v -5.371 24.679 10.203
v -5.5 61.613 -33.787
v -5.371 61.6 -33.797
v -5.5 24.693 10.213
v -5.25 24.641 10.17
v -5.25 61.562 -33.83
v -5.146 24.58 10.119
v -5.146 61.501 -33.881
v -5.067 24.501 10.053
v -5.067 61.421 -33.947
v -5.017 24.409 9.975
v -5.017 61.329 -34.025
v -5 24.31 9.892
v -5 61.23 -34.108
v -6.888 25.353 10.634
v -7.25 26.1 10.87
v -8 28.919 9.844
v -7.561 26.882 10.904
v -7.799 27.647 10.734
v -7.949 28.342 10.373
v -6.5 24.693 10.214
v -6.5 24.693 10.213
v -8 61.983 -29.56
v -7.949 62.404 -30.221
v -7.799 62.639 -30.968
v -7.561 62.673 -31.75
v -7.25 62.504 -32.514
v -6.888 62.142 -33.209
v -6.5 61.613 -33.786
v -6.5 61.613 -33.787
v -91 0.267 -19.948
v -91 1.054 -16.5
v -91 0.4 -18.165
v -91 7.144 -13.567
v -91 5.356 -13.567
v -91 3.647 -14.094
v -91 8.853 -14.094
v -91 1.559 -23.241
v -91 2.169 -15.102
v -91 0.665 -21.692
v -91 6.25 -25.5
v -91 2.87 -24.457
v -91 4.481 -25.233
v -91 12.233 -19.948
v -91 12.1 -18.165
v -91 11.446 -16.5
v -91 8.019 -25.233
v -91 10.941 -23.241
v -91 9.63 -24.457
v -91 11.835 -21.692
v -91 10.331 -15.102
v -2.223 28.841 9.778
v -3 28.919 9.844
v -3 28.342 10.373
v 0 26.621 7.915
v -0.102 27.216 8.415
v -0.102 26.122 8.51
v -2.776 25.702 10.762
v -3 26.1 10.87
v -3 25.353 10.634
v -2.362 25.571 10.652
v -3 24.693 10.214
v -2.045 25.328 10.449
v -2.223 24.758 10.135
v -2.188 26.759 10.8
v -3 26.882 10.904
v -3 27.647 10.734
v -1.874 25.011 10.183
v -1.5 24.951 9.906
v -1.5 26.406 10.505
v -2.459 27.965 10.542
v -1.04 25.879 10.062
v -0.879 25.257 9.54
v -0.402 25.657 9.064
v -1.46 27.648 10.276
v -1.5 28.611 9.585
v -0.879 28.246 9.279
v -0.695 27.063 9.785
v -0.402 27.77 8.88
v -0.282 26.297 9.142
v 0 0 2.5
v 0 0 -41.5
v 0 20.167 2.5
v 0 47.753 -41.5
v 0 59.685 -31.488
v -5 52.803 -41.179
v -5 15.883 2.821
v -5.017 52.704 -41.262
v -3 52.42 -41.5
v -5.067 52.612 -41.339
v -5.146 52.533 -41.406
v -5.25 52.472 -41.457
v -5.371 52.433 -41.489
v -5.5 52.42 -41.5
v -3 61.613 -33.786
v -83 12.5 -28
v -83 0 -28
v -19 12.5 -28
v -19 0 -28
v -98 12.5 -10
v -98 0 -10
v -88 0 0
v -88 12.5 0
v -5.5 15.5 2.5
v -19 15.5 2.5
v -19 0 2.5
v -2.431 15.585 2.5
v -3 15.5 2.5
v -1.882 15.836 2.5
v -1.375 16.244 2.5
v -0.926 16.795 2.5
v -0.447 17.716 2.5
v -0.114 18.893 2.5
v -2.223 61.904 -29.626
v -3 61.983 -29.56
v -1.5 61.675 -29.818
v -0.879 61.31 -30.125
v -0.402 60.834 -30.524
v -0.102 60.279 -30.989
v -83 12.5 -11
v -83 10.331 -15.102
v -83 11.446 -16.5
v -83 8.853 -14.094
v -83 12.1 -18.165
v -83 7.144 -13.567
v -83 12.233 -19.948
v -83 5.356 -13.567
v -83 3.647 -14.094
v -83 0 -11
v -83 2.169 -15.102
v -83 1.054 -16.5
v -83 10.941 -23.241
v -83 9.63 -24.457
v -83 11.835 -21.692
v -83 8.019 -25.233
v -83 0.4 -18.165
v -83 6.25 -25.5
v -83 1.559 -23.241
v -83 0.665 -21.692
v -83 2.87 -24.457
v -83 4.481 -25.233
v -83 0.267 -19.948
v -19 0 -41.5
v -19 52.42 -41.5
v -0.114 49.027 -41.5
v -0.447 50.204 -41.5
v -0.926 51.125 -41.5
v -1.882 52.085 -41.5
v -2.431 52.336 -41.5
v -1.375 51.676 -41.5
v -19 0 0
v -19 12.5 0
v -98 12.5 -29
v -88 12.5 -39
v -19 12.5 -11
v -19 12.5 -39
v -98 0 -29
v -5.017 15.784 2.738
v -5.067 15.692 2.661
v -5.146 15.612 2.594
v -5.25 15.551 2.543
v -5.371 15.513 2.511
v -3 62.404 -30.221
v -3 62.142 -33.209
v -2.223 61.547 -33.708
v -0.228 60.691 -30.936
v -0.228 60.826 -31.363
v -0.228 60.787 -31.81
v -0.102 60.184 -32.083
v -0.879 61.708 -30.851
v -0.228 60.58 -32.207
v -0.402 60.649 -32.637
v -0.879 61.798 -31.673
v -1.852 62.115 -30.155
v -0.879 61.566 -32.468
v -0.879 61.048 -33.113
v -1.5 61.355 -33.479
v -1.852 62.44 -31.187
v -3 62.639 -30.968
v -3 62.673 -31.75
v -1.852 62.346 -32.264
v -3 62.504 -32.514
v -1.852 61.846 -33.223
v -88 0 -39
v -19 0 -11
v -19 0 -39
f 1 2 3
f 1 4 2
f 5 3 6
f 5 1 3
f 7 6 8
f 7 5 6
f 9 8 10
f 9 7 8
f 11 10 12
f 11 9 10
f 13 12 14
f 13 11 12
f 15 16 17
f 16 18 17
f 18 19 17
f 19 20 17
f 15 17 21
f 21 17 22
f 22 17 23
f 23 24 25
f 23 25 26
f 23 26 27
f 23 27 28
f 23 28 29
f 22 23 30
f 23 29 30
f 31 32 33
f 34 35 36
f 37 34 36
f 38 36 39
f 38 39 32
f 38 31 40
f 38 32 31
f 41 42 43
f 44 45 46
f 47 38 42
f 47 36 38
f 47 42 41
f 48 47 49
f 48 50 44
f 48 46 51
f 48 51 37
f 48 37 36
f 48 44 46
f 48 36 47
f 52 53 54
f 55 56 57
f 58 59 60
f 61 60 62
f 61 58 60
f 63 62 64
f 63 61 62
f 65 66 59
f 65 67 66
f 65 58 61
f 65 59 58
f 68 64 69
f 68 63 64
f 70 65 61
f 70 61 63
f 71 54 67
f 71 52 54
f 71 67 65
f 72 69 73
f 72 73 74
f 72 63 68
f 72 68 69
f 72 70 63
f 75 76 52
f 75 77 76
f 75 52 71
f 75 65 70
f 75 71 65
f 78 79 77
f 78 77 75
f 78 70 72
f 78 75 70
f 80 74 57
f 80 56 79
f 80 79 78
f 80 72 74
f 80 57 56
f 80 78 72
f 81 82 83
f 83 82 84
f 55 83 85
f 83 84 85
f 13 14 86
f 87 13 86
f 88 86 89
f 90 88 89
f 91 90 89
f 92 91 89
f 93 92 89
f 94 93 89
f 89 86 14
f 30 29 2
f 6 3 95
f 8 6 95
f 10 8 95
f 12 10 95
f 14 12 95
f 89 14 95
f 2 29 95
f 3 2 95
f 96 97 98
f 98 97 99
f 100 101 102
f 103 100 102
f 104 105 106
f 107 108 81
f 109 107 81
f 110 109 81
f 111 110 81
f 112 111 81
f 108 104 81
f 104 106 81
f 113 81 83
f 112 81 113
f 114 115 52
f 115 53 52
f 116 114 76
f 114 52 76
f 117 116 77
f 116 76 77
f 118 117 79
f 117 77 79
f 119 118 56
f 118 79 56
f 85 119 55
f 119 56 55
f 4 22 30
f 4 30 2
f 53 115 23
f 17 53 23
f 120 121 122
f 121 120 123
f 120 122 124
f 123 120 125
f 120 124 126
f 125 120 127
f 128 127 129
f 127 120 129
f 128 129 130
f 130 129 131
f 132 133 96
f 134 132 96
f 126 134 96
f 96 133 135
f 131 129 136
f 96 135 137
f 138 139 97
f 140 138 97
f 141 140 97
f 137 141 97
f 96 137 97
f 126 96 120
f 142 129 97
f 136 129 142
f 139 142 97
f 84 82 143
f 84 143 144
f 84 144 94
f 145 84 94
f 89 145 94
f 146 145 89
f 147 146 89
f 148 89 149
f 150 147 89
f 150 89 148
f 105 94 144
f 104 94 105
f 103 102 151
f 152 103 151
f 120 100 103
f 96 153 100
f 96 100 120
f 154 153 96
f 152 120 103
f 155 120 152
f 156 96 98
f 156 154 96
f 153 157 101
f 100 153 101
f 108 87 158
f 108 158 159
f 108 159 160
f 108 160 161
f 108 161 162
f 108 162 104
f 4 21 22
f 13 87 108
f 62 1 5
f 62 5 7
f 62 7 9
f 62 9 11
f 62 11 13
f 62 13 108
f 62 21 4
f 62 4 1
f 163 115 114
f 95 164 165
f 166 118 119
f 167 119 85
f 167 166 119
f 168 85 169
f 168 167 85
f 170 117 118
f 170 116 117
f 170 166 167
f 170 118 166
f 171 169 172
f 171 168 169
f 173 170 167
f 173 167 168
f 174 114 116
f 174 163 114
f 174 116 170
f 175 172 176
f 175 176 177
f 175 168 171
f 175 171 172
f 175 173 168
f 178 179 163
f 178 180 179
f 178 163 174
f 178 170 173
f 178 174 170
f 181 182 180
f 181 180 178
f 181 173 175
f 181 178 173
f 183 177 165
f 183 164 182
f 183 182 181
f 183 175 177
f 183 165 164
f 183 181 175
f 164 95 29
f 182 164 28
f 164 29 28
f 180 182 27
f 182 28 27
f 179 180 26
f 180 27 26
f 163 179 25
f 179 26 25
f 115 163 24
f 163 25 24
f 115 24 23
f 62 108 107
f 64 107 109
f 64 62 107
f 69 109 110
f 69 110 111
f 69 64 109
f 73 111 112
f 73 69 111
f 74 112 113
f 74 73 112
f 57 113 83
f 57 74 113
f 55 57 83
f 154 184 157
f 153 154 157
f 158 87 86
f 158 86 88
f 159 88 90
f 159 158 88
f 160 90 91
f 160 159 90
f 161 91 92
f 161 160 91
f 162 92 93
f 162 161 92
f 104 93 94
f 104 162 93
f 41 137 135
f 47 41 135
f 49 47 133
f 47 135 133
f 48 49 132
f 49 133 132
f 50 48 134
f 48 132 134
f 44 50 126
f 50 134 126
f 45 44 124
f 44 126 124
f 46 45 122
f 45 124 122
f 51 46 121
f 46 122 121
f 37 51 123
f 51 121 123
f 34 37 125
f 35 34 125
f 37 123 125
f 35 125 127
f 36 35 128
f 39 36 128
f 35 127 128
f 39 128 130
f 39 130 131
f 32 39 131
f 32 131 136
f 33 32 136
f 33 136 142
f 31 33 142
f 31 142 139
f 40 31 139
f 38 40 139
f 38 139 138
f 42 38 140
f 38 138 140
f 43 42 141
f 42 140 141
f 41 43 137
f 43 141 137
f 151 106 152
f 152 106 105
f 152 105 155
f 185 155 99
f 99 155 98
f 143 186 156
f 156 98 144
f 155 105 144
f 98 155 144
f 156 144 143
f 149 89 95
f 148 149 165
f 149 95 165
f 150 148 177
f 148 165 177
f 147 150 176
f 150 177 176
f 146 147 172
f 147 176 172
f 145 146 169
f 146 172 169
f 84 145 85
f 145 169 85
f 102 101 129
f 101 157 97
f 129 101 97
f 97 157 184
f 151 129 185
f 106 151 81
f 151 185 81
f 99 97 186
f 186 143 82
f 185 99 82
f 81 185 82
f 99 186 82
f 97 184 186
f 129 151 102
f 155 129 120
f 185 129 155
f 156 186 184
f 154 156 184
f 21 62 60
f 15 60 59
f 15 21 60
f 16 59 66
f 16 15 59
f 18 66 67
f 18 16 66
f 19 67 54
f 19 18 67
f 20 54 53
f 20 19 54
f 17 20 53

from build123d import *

# Parameters (mm, degrees)
SKETCH1_W                = 64
SKETCH1_H                = 17
BOSS_EXTRUDE1_DEPTH      = 12.5
SKETCH2_R                = 6
CUT_EXTRUDE1_DEPTH       = 8
BOSS_EXTRUDE2_DEPTH      = 3
BOSS_EXTRUDE2_DEPTH_BACK = 12.5
SKETCH3_W                = 19
SKETCH3_H                = 44
BOSS_EXTRUDE3_DEPTH      = 19
BOSS_EXTRUDE4_DEPTH      = 57.437921
FILLET2_R                = 0.5
FILLET3_R                = 3


with BuildPart() as part:
    # Sketch1 → Boss-Extrude1 (new body)
    with BuildSketch(Plane(origin=(0, 0, 0), x_dir=(1, 0, 0), z_dir=(0, 1, 0))):
        Polygon((0, 39), (-88, 39), (-98, 29), (-98, 10), (-88, 0), (0, 0), align=None)
        with Locations((-51, 19.5)):
            Rectangle(SKETCH1_W, SKETCH1_H, mode=Mode.SUBTRACT)
    extrude(amount=BOSS_EXTRUDE1_DEPTH)

    # Sketch2 → Cut-Extrude1 (cut)
    with BuildSketch(Plane(origin=(-83, 0, 0), x_dir=(0, 0, -1), z_dir=(1, 0, 0))):
        with Locations((19.5, 6.25)):
            Circle(SKETCH2_R)
    extrude(amount=-CUT_EXTRUDE1_DEPTH, mode=Mode.SUBTRACT)

    # Sketch3 → Boss-Extrude2 (add, two sides: drawn at the far end of the back side and taken through both)
    with BuildSketch(Plane(origin=(0, 12.5, 0), x_dir=(1, 0, 0), z_dir=(0, 1, 0)).offset(-BOSS_EXTRUDE2_DEPTH_BACK)):
        with Locations((-9.5, 19.5)):
            Rectangle(SKETCH3_W, SKETCH3_H)
    extrude(amount=BOSS_EXTRUDE2_DEPTH + BOSS_EXTRUDE2_DEPTH_BACK)

    # Sketch4 → Boss-Extrude3 (add)
    with BuildSketch(Plane(origin=(0, 0, 0), x_dir=(0, 0, -1), z_dir=(1, 0, 0))):
        Polygon((41.5, 15.5), (41.5, 52.420383772), (-2.5, 15.5), align=None)
    extrude(amount=-BOSS_EXTRUDE3_DEPTH)

    # Sketch5 → Boss-Extrude4 (add)
    with BuildSketch(Plane(origin=(0, 52.420383772, -41.5), x_dir=(1, 0, 0), z_dir=(0, -0.6427876096865353, 0.7660444431189817))):
        Polygon((0, 0), (0, 15), (-8, 15), (-6.5, 12), (-5, 12), (-5, 0), align=None)
    extrude(amount=BOSS_EXTRUDE4_DEPTH)

    # Fillet2
    fillet2_edges = [part.edges().sort_by_distance(p)[0] for p in [
        (-5, 33.960191799, -19.499999897),
        (-5, 43.152725117, -11.786548581),
    ]]
    fillet(fillet2_edges, radius=FILLET2_R)

    # Fillet3
    fillet3_edges = [part.edges().sort_by_distance(p)[0] for p in [
        (-4, 63.911050419, -31.858185855),
        (0, 45.450858446, -9.858185752),
        (-4, 26.990666474, 12.141814352),
        (0, 21.24533315, 7.320907279),
        (0, 58.165717095, -36.679092927),
    ]]
    fillet(fillet3_edges, radius=FILLET3_R - 0.0001)  # a hair under: the kernel refuses the full size


solid = part.part
